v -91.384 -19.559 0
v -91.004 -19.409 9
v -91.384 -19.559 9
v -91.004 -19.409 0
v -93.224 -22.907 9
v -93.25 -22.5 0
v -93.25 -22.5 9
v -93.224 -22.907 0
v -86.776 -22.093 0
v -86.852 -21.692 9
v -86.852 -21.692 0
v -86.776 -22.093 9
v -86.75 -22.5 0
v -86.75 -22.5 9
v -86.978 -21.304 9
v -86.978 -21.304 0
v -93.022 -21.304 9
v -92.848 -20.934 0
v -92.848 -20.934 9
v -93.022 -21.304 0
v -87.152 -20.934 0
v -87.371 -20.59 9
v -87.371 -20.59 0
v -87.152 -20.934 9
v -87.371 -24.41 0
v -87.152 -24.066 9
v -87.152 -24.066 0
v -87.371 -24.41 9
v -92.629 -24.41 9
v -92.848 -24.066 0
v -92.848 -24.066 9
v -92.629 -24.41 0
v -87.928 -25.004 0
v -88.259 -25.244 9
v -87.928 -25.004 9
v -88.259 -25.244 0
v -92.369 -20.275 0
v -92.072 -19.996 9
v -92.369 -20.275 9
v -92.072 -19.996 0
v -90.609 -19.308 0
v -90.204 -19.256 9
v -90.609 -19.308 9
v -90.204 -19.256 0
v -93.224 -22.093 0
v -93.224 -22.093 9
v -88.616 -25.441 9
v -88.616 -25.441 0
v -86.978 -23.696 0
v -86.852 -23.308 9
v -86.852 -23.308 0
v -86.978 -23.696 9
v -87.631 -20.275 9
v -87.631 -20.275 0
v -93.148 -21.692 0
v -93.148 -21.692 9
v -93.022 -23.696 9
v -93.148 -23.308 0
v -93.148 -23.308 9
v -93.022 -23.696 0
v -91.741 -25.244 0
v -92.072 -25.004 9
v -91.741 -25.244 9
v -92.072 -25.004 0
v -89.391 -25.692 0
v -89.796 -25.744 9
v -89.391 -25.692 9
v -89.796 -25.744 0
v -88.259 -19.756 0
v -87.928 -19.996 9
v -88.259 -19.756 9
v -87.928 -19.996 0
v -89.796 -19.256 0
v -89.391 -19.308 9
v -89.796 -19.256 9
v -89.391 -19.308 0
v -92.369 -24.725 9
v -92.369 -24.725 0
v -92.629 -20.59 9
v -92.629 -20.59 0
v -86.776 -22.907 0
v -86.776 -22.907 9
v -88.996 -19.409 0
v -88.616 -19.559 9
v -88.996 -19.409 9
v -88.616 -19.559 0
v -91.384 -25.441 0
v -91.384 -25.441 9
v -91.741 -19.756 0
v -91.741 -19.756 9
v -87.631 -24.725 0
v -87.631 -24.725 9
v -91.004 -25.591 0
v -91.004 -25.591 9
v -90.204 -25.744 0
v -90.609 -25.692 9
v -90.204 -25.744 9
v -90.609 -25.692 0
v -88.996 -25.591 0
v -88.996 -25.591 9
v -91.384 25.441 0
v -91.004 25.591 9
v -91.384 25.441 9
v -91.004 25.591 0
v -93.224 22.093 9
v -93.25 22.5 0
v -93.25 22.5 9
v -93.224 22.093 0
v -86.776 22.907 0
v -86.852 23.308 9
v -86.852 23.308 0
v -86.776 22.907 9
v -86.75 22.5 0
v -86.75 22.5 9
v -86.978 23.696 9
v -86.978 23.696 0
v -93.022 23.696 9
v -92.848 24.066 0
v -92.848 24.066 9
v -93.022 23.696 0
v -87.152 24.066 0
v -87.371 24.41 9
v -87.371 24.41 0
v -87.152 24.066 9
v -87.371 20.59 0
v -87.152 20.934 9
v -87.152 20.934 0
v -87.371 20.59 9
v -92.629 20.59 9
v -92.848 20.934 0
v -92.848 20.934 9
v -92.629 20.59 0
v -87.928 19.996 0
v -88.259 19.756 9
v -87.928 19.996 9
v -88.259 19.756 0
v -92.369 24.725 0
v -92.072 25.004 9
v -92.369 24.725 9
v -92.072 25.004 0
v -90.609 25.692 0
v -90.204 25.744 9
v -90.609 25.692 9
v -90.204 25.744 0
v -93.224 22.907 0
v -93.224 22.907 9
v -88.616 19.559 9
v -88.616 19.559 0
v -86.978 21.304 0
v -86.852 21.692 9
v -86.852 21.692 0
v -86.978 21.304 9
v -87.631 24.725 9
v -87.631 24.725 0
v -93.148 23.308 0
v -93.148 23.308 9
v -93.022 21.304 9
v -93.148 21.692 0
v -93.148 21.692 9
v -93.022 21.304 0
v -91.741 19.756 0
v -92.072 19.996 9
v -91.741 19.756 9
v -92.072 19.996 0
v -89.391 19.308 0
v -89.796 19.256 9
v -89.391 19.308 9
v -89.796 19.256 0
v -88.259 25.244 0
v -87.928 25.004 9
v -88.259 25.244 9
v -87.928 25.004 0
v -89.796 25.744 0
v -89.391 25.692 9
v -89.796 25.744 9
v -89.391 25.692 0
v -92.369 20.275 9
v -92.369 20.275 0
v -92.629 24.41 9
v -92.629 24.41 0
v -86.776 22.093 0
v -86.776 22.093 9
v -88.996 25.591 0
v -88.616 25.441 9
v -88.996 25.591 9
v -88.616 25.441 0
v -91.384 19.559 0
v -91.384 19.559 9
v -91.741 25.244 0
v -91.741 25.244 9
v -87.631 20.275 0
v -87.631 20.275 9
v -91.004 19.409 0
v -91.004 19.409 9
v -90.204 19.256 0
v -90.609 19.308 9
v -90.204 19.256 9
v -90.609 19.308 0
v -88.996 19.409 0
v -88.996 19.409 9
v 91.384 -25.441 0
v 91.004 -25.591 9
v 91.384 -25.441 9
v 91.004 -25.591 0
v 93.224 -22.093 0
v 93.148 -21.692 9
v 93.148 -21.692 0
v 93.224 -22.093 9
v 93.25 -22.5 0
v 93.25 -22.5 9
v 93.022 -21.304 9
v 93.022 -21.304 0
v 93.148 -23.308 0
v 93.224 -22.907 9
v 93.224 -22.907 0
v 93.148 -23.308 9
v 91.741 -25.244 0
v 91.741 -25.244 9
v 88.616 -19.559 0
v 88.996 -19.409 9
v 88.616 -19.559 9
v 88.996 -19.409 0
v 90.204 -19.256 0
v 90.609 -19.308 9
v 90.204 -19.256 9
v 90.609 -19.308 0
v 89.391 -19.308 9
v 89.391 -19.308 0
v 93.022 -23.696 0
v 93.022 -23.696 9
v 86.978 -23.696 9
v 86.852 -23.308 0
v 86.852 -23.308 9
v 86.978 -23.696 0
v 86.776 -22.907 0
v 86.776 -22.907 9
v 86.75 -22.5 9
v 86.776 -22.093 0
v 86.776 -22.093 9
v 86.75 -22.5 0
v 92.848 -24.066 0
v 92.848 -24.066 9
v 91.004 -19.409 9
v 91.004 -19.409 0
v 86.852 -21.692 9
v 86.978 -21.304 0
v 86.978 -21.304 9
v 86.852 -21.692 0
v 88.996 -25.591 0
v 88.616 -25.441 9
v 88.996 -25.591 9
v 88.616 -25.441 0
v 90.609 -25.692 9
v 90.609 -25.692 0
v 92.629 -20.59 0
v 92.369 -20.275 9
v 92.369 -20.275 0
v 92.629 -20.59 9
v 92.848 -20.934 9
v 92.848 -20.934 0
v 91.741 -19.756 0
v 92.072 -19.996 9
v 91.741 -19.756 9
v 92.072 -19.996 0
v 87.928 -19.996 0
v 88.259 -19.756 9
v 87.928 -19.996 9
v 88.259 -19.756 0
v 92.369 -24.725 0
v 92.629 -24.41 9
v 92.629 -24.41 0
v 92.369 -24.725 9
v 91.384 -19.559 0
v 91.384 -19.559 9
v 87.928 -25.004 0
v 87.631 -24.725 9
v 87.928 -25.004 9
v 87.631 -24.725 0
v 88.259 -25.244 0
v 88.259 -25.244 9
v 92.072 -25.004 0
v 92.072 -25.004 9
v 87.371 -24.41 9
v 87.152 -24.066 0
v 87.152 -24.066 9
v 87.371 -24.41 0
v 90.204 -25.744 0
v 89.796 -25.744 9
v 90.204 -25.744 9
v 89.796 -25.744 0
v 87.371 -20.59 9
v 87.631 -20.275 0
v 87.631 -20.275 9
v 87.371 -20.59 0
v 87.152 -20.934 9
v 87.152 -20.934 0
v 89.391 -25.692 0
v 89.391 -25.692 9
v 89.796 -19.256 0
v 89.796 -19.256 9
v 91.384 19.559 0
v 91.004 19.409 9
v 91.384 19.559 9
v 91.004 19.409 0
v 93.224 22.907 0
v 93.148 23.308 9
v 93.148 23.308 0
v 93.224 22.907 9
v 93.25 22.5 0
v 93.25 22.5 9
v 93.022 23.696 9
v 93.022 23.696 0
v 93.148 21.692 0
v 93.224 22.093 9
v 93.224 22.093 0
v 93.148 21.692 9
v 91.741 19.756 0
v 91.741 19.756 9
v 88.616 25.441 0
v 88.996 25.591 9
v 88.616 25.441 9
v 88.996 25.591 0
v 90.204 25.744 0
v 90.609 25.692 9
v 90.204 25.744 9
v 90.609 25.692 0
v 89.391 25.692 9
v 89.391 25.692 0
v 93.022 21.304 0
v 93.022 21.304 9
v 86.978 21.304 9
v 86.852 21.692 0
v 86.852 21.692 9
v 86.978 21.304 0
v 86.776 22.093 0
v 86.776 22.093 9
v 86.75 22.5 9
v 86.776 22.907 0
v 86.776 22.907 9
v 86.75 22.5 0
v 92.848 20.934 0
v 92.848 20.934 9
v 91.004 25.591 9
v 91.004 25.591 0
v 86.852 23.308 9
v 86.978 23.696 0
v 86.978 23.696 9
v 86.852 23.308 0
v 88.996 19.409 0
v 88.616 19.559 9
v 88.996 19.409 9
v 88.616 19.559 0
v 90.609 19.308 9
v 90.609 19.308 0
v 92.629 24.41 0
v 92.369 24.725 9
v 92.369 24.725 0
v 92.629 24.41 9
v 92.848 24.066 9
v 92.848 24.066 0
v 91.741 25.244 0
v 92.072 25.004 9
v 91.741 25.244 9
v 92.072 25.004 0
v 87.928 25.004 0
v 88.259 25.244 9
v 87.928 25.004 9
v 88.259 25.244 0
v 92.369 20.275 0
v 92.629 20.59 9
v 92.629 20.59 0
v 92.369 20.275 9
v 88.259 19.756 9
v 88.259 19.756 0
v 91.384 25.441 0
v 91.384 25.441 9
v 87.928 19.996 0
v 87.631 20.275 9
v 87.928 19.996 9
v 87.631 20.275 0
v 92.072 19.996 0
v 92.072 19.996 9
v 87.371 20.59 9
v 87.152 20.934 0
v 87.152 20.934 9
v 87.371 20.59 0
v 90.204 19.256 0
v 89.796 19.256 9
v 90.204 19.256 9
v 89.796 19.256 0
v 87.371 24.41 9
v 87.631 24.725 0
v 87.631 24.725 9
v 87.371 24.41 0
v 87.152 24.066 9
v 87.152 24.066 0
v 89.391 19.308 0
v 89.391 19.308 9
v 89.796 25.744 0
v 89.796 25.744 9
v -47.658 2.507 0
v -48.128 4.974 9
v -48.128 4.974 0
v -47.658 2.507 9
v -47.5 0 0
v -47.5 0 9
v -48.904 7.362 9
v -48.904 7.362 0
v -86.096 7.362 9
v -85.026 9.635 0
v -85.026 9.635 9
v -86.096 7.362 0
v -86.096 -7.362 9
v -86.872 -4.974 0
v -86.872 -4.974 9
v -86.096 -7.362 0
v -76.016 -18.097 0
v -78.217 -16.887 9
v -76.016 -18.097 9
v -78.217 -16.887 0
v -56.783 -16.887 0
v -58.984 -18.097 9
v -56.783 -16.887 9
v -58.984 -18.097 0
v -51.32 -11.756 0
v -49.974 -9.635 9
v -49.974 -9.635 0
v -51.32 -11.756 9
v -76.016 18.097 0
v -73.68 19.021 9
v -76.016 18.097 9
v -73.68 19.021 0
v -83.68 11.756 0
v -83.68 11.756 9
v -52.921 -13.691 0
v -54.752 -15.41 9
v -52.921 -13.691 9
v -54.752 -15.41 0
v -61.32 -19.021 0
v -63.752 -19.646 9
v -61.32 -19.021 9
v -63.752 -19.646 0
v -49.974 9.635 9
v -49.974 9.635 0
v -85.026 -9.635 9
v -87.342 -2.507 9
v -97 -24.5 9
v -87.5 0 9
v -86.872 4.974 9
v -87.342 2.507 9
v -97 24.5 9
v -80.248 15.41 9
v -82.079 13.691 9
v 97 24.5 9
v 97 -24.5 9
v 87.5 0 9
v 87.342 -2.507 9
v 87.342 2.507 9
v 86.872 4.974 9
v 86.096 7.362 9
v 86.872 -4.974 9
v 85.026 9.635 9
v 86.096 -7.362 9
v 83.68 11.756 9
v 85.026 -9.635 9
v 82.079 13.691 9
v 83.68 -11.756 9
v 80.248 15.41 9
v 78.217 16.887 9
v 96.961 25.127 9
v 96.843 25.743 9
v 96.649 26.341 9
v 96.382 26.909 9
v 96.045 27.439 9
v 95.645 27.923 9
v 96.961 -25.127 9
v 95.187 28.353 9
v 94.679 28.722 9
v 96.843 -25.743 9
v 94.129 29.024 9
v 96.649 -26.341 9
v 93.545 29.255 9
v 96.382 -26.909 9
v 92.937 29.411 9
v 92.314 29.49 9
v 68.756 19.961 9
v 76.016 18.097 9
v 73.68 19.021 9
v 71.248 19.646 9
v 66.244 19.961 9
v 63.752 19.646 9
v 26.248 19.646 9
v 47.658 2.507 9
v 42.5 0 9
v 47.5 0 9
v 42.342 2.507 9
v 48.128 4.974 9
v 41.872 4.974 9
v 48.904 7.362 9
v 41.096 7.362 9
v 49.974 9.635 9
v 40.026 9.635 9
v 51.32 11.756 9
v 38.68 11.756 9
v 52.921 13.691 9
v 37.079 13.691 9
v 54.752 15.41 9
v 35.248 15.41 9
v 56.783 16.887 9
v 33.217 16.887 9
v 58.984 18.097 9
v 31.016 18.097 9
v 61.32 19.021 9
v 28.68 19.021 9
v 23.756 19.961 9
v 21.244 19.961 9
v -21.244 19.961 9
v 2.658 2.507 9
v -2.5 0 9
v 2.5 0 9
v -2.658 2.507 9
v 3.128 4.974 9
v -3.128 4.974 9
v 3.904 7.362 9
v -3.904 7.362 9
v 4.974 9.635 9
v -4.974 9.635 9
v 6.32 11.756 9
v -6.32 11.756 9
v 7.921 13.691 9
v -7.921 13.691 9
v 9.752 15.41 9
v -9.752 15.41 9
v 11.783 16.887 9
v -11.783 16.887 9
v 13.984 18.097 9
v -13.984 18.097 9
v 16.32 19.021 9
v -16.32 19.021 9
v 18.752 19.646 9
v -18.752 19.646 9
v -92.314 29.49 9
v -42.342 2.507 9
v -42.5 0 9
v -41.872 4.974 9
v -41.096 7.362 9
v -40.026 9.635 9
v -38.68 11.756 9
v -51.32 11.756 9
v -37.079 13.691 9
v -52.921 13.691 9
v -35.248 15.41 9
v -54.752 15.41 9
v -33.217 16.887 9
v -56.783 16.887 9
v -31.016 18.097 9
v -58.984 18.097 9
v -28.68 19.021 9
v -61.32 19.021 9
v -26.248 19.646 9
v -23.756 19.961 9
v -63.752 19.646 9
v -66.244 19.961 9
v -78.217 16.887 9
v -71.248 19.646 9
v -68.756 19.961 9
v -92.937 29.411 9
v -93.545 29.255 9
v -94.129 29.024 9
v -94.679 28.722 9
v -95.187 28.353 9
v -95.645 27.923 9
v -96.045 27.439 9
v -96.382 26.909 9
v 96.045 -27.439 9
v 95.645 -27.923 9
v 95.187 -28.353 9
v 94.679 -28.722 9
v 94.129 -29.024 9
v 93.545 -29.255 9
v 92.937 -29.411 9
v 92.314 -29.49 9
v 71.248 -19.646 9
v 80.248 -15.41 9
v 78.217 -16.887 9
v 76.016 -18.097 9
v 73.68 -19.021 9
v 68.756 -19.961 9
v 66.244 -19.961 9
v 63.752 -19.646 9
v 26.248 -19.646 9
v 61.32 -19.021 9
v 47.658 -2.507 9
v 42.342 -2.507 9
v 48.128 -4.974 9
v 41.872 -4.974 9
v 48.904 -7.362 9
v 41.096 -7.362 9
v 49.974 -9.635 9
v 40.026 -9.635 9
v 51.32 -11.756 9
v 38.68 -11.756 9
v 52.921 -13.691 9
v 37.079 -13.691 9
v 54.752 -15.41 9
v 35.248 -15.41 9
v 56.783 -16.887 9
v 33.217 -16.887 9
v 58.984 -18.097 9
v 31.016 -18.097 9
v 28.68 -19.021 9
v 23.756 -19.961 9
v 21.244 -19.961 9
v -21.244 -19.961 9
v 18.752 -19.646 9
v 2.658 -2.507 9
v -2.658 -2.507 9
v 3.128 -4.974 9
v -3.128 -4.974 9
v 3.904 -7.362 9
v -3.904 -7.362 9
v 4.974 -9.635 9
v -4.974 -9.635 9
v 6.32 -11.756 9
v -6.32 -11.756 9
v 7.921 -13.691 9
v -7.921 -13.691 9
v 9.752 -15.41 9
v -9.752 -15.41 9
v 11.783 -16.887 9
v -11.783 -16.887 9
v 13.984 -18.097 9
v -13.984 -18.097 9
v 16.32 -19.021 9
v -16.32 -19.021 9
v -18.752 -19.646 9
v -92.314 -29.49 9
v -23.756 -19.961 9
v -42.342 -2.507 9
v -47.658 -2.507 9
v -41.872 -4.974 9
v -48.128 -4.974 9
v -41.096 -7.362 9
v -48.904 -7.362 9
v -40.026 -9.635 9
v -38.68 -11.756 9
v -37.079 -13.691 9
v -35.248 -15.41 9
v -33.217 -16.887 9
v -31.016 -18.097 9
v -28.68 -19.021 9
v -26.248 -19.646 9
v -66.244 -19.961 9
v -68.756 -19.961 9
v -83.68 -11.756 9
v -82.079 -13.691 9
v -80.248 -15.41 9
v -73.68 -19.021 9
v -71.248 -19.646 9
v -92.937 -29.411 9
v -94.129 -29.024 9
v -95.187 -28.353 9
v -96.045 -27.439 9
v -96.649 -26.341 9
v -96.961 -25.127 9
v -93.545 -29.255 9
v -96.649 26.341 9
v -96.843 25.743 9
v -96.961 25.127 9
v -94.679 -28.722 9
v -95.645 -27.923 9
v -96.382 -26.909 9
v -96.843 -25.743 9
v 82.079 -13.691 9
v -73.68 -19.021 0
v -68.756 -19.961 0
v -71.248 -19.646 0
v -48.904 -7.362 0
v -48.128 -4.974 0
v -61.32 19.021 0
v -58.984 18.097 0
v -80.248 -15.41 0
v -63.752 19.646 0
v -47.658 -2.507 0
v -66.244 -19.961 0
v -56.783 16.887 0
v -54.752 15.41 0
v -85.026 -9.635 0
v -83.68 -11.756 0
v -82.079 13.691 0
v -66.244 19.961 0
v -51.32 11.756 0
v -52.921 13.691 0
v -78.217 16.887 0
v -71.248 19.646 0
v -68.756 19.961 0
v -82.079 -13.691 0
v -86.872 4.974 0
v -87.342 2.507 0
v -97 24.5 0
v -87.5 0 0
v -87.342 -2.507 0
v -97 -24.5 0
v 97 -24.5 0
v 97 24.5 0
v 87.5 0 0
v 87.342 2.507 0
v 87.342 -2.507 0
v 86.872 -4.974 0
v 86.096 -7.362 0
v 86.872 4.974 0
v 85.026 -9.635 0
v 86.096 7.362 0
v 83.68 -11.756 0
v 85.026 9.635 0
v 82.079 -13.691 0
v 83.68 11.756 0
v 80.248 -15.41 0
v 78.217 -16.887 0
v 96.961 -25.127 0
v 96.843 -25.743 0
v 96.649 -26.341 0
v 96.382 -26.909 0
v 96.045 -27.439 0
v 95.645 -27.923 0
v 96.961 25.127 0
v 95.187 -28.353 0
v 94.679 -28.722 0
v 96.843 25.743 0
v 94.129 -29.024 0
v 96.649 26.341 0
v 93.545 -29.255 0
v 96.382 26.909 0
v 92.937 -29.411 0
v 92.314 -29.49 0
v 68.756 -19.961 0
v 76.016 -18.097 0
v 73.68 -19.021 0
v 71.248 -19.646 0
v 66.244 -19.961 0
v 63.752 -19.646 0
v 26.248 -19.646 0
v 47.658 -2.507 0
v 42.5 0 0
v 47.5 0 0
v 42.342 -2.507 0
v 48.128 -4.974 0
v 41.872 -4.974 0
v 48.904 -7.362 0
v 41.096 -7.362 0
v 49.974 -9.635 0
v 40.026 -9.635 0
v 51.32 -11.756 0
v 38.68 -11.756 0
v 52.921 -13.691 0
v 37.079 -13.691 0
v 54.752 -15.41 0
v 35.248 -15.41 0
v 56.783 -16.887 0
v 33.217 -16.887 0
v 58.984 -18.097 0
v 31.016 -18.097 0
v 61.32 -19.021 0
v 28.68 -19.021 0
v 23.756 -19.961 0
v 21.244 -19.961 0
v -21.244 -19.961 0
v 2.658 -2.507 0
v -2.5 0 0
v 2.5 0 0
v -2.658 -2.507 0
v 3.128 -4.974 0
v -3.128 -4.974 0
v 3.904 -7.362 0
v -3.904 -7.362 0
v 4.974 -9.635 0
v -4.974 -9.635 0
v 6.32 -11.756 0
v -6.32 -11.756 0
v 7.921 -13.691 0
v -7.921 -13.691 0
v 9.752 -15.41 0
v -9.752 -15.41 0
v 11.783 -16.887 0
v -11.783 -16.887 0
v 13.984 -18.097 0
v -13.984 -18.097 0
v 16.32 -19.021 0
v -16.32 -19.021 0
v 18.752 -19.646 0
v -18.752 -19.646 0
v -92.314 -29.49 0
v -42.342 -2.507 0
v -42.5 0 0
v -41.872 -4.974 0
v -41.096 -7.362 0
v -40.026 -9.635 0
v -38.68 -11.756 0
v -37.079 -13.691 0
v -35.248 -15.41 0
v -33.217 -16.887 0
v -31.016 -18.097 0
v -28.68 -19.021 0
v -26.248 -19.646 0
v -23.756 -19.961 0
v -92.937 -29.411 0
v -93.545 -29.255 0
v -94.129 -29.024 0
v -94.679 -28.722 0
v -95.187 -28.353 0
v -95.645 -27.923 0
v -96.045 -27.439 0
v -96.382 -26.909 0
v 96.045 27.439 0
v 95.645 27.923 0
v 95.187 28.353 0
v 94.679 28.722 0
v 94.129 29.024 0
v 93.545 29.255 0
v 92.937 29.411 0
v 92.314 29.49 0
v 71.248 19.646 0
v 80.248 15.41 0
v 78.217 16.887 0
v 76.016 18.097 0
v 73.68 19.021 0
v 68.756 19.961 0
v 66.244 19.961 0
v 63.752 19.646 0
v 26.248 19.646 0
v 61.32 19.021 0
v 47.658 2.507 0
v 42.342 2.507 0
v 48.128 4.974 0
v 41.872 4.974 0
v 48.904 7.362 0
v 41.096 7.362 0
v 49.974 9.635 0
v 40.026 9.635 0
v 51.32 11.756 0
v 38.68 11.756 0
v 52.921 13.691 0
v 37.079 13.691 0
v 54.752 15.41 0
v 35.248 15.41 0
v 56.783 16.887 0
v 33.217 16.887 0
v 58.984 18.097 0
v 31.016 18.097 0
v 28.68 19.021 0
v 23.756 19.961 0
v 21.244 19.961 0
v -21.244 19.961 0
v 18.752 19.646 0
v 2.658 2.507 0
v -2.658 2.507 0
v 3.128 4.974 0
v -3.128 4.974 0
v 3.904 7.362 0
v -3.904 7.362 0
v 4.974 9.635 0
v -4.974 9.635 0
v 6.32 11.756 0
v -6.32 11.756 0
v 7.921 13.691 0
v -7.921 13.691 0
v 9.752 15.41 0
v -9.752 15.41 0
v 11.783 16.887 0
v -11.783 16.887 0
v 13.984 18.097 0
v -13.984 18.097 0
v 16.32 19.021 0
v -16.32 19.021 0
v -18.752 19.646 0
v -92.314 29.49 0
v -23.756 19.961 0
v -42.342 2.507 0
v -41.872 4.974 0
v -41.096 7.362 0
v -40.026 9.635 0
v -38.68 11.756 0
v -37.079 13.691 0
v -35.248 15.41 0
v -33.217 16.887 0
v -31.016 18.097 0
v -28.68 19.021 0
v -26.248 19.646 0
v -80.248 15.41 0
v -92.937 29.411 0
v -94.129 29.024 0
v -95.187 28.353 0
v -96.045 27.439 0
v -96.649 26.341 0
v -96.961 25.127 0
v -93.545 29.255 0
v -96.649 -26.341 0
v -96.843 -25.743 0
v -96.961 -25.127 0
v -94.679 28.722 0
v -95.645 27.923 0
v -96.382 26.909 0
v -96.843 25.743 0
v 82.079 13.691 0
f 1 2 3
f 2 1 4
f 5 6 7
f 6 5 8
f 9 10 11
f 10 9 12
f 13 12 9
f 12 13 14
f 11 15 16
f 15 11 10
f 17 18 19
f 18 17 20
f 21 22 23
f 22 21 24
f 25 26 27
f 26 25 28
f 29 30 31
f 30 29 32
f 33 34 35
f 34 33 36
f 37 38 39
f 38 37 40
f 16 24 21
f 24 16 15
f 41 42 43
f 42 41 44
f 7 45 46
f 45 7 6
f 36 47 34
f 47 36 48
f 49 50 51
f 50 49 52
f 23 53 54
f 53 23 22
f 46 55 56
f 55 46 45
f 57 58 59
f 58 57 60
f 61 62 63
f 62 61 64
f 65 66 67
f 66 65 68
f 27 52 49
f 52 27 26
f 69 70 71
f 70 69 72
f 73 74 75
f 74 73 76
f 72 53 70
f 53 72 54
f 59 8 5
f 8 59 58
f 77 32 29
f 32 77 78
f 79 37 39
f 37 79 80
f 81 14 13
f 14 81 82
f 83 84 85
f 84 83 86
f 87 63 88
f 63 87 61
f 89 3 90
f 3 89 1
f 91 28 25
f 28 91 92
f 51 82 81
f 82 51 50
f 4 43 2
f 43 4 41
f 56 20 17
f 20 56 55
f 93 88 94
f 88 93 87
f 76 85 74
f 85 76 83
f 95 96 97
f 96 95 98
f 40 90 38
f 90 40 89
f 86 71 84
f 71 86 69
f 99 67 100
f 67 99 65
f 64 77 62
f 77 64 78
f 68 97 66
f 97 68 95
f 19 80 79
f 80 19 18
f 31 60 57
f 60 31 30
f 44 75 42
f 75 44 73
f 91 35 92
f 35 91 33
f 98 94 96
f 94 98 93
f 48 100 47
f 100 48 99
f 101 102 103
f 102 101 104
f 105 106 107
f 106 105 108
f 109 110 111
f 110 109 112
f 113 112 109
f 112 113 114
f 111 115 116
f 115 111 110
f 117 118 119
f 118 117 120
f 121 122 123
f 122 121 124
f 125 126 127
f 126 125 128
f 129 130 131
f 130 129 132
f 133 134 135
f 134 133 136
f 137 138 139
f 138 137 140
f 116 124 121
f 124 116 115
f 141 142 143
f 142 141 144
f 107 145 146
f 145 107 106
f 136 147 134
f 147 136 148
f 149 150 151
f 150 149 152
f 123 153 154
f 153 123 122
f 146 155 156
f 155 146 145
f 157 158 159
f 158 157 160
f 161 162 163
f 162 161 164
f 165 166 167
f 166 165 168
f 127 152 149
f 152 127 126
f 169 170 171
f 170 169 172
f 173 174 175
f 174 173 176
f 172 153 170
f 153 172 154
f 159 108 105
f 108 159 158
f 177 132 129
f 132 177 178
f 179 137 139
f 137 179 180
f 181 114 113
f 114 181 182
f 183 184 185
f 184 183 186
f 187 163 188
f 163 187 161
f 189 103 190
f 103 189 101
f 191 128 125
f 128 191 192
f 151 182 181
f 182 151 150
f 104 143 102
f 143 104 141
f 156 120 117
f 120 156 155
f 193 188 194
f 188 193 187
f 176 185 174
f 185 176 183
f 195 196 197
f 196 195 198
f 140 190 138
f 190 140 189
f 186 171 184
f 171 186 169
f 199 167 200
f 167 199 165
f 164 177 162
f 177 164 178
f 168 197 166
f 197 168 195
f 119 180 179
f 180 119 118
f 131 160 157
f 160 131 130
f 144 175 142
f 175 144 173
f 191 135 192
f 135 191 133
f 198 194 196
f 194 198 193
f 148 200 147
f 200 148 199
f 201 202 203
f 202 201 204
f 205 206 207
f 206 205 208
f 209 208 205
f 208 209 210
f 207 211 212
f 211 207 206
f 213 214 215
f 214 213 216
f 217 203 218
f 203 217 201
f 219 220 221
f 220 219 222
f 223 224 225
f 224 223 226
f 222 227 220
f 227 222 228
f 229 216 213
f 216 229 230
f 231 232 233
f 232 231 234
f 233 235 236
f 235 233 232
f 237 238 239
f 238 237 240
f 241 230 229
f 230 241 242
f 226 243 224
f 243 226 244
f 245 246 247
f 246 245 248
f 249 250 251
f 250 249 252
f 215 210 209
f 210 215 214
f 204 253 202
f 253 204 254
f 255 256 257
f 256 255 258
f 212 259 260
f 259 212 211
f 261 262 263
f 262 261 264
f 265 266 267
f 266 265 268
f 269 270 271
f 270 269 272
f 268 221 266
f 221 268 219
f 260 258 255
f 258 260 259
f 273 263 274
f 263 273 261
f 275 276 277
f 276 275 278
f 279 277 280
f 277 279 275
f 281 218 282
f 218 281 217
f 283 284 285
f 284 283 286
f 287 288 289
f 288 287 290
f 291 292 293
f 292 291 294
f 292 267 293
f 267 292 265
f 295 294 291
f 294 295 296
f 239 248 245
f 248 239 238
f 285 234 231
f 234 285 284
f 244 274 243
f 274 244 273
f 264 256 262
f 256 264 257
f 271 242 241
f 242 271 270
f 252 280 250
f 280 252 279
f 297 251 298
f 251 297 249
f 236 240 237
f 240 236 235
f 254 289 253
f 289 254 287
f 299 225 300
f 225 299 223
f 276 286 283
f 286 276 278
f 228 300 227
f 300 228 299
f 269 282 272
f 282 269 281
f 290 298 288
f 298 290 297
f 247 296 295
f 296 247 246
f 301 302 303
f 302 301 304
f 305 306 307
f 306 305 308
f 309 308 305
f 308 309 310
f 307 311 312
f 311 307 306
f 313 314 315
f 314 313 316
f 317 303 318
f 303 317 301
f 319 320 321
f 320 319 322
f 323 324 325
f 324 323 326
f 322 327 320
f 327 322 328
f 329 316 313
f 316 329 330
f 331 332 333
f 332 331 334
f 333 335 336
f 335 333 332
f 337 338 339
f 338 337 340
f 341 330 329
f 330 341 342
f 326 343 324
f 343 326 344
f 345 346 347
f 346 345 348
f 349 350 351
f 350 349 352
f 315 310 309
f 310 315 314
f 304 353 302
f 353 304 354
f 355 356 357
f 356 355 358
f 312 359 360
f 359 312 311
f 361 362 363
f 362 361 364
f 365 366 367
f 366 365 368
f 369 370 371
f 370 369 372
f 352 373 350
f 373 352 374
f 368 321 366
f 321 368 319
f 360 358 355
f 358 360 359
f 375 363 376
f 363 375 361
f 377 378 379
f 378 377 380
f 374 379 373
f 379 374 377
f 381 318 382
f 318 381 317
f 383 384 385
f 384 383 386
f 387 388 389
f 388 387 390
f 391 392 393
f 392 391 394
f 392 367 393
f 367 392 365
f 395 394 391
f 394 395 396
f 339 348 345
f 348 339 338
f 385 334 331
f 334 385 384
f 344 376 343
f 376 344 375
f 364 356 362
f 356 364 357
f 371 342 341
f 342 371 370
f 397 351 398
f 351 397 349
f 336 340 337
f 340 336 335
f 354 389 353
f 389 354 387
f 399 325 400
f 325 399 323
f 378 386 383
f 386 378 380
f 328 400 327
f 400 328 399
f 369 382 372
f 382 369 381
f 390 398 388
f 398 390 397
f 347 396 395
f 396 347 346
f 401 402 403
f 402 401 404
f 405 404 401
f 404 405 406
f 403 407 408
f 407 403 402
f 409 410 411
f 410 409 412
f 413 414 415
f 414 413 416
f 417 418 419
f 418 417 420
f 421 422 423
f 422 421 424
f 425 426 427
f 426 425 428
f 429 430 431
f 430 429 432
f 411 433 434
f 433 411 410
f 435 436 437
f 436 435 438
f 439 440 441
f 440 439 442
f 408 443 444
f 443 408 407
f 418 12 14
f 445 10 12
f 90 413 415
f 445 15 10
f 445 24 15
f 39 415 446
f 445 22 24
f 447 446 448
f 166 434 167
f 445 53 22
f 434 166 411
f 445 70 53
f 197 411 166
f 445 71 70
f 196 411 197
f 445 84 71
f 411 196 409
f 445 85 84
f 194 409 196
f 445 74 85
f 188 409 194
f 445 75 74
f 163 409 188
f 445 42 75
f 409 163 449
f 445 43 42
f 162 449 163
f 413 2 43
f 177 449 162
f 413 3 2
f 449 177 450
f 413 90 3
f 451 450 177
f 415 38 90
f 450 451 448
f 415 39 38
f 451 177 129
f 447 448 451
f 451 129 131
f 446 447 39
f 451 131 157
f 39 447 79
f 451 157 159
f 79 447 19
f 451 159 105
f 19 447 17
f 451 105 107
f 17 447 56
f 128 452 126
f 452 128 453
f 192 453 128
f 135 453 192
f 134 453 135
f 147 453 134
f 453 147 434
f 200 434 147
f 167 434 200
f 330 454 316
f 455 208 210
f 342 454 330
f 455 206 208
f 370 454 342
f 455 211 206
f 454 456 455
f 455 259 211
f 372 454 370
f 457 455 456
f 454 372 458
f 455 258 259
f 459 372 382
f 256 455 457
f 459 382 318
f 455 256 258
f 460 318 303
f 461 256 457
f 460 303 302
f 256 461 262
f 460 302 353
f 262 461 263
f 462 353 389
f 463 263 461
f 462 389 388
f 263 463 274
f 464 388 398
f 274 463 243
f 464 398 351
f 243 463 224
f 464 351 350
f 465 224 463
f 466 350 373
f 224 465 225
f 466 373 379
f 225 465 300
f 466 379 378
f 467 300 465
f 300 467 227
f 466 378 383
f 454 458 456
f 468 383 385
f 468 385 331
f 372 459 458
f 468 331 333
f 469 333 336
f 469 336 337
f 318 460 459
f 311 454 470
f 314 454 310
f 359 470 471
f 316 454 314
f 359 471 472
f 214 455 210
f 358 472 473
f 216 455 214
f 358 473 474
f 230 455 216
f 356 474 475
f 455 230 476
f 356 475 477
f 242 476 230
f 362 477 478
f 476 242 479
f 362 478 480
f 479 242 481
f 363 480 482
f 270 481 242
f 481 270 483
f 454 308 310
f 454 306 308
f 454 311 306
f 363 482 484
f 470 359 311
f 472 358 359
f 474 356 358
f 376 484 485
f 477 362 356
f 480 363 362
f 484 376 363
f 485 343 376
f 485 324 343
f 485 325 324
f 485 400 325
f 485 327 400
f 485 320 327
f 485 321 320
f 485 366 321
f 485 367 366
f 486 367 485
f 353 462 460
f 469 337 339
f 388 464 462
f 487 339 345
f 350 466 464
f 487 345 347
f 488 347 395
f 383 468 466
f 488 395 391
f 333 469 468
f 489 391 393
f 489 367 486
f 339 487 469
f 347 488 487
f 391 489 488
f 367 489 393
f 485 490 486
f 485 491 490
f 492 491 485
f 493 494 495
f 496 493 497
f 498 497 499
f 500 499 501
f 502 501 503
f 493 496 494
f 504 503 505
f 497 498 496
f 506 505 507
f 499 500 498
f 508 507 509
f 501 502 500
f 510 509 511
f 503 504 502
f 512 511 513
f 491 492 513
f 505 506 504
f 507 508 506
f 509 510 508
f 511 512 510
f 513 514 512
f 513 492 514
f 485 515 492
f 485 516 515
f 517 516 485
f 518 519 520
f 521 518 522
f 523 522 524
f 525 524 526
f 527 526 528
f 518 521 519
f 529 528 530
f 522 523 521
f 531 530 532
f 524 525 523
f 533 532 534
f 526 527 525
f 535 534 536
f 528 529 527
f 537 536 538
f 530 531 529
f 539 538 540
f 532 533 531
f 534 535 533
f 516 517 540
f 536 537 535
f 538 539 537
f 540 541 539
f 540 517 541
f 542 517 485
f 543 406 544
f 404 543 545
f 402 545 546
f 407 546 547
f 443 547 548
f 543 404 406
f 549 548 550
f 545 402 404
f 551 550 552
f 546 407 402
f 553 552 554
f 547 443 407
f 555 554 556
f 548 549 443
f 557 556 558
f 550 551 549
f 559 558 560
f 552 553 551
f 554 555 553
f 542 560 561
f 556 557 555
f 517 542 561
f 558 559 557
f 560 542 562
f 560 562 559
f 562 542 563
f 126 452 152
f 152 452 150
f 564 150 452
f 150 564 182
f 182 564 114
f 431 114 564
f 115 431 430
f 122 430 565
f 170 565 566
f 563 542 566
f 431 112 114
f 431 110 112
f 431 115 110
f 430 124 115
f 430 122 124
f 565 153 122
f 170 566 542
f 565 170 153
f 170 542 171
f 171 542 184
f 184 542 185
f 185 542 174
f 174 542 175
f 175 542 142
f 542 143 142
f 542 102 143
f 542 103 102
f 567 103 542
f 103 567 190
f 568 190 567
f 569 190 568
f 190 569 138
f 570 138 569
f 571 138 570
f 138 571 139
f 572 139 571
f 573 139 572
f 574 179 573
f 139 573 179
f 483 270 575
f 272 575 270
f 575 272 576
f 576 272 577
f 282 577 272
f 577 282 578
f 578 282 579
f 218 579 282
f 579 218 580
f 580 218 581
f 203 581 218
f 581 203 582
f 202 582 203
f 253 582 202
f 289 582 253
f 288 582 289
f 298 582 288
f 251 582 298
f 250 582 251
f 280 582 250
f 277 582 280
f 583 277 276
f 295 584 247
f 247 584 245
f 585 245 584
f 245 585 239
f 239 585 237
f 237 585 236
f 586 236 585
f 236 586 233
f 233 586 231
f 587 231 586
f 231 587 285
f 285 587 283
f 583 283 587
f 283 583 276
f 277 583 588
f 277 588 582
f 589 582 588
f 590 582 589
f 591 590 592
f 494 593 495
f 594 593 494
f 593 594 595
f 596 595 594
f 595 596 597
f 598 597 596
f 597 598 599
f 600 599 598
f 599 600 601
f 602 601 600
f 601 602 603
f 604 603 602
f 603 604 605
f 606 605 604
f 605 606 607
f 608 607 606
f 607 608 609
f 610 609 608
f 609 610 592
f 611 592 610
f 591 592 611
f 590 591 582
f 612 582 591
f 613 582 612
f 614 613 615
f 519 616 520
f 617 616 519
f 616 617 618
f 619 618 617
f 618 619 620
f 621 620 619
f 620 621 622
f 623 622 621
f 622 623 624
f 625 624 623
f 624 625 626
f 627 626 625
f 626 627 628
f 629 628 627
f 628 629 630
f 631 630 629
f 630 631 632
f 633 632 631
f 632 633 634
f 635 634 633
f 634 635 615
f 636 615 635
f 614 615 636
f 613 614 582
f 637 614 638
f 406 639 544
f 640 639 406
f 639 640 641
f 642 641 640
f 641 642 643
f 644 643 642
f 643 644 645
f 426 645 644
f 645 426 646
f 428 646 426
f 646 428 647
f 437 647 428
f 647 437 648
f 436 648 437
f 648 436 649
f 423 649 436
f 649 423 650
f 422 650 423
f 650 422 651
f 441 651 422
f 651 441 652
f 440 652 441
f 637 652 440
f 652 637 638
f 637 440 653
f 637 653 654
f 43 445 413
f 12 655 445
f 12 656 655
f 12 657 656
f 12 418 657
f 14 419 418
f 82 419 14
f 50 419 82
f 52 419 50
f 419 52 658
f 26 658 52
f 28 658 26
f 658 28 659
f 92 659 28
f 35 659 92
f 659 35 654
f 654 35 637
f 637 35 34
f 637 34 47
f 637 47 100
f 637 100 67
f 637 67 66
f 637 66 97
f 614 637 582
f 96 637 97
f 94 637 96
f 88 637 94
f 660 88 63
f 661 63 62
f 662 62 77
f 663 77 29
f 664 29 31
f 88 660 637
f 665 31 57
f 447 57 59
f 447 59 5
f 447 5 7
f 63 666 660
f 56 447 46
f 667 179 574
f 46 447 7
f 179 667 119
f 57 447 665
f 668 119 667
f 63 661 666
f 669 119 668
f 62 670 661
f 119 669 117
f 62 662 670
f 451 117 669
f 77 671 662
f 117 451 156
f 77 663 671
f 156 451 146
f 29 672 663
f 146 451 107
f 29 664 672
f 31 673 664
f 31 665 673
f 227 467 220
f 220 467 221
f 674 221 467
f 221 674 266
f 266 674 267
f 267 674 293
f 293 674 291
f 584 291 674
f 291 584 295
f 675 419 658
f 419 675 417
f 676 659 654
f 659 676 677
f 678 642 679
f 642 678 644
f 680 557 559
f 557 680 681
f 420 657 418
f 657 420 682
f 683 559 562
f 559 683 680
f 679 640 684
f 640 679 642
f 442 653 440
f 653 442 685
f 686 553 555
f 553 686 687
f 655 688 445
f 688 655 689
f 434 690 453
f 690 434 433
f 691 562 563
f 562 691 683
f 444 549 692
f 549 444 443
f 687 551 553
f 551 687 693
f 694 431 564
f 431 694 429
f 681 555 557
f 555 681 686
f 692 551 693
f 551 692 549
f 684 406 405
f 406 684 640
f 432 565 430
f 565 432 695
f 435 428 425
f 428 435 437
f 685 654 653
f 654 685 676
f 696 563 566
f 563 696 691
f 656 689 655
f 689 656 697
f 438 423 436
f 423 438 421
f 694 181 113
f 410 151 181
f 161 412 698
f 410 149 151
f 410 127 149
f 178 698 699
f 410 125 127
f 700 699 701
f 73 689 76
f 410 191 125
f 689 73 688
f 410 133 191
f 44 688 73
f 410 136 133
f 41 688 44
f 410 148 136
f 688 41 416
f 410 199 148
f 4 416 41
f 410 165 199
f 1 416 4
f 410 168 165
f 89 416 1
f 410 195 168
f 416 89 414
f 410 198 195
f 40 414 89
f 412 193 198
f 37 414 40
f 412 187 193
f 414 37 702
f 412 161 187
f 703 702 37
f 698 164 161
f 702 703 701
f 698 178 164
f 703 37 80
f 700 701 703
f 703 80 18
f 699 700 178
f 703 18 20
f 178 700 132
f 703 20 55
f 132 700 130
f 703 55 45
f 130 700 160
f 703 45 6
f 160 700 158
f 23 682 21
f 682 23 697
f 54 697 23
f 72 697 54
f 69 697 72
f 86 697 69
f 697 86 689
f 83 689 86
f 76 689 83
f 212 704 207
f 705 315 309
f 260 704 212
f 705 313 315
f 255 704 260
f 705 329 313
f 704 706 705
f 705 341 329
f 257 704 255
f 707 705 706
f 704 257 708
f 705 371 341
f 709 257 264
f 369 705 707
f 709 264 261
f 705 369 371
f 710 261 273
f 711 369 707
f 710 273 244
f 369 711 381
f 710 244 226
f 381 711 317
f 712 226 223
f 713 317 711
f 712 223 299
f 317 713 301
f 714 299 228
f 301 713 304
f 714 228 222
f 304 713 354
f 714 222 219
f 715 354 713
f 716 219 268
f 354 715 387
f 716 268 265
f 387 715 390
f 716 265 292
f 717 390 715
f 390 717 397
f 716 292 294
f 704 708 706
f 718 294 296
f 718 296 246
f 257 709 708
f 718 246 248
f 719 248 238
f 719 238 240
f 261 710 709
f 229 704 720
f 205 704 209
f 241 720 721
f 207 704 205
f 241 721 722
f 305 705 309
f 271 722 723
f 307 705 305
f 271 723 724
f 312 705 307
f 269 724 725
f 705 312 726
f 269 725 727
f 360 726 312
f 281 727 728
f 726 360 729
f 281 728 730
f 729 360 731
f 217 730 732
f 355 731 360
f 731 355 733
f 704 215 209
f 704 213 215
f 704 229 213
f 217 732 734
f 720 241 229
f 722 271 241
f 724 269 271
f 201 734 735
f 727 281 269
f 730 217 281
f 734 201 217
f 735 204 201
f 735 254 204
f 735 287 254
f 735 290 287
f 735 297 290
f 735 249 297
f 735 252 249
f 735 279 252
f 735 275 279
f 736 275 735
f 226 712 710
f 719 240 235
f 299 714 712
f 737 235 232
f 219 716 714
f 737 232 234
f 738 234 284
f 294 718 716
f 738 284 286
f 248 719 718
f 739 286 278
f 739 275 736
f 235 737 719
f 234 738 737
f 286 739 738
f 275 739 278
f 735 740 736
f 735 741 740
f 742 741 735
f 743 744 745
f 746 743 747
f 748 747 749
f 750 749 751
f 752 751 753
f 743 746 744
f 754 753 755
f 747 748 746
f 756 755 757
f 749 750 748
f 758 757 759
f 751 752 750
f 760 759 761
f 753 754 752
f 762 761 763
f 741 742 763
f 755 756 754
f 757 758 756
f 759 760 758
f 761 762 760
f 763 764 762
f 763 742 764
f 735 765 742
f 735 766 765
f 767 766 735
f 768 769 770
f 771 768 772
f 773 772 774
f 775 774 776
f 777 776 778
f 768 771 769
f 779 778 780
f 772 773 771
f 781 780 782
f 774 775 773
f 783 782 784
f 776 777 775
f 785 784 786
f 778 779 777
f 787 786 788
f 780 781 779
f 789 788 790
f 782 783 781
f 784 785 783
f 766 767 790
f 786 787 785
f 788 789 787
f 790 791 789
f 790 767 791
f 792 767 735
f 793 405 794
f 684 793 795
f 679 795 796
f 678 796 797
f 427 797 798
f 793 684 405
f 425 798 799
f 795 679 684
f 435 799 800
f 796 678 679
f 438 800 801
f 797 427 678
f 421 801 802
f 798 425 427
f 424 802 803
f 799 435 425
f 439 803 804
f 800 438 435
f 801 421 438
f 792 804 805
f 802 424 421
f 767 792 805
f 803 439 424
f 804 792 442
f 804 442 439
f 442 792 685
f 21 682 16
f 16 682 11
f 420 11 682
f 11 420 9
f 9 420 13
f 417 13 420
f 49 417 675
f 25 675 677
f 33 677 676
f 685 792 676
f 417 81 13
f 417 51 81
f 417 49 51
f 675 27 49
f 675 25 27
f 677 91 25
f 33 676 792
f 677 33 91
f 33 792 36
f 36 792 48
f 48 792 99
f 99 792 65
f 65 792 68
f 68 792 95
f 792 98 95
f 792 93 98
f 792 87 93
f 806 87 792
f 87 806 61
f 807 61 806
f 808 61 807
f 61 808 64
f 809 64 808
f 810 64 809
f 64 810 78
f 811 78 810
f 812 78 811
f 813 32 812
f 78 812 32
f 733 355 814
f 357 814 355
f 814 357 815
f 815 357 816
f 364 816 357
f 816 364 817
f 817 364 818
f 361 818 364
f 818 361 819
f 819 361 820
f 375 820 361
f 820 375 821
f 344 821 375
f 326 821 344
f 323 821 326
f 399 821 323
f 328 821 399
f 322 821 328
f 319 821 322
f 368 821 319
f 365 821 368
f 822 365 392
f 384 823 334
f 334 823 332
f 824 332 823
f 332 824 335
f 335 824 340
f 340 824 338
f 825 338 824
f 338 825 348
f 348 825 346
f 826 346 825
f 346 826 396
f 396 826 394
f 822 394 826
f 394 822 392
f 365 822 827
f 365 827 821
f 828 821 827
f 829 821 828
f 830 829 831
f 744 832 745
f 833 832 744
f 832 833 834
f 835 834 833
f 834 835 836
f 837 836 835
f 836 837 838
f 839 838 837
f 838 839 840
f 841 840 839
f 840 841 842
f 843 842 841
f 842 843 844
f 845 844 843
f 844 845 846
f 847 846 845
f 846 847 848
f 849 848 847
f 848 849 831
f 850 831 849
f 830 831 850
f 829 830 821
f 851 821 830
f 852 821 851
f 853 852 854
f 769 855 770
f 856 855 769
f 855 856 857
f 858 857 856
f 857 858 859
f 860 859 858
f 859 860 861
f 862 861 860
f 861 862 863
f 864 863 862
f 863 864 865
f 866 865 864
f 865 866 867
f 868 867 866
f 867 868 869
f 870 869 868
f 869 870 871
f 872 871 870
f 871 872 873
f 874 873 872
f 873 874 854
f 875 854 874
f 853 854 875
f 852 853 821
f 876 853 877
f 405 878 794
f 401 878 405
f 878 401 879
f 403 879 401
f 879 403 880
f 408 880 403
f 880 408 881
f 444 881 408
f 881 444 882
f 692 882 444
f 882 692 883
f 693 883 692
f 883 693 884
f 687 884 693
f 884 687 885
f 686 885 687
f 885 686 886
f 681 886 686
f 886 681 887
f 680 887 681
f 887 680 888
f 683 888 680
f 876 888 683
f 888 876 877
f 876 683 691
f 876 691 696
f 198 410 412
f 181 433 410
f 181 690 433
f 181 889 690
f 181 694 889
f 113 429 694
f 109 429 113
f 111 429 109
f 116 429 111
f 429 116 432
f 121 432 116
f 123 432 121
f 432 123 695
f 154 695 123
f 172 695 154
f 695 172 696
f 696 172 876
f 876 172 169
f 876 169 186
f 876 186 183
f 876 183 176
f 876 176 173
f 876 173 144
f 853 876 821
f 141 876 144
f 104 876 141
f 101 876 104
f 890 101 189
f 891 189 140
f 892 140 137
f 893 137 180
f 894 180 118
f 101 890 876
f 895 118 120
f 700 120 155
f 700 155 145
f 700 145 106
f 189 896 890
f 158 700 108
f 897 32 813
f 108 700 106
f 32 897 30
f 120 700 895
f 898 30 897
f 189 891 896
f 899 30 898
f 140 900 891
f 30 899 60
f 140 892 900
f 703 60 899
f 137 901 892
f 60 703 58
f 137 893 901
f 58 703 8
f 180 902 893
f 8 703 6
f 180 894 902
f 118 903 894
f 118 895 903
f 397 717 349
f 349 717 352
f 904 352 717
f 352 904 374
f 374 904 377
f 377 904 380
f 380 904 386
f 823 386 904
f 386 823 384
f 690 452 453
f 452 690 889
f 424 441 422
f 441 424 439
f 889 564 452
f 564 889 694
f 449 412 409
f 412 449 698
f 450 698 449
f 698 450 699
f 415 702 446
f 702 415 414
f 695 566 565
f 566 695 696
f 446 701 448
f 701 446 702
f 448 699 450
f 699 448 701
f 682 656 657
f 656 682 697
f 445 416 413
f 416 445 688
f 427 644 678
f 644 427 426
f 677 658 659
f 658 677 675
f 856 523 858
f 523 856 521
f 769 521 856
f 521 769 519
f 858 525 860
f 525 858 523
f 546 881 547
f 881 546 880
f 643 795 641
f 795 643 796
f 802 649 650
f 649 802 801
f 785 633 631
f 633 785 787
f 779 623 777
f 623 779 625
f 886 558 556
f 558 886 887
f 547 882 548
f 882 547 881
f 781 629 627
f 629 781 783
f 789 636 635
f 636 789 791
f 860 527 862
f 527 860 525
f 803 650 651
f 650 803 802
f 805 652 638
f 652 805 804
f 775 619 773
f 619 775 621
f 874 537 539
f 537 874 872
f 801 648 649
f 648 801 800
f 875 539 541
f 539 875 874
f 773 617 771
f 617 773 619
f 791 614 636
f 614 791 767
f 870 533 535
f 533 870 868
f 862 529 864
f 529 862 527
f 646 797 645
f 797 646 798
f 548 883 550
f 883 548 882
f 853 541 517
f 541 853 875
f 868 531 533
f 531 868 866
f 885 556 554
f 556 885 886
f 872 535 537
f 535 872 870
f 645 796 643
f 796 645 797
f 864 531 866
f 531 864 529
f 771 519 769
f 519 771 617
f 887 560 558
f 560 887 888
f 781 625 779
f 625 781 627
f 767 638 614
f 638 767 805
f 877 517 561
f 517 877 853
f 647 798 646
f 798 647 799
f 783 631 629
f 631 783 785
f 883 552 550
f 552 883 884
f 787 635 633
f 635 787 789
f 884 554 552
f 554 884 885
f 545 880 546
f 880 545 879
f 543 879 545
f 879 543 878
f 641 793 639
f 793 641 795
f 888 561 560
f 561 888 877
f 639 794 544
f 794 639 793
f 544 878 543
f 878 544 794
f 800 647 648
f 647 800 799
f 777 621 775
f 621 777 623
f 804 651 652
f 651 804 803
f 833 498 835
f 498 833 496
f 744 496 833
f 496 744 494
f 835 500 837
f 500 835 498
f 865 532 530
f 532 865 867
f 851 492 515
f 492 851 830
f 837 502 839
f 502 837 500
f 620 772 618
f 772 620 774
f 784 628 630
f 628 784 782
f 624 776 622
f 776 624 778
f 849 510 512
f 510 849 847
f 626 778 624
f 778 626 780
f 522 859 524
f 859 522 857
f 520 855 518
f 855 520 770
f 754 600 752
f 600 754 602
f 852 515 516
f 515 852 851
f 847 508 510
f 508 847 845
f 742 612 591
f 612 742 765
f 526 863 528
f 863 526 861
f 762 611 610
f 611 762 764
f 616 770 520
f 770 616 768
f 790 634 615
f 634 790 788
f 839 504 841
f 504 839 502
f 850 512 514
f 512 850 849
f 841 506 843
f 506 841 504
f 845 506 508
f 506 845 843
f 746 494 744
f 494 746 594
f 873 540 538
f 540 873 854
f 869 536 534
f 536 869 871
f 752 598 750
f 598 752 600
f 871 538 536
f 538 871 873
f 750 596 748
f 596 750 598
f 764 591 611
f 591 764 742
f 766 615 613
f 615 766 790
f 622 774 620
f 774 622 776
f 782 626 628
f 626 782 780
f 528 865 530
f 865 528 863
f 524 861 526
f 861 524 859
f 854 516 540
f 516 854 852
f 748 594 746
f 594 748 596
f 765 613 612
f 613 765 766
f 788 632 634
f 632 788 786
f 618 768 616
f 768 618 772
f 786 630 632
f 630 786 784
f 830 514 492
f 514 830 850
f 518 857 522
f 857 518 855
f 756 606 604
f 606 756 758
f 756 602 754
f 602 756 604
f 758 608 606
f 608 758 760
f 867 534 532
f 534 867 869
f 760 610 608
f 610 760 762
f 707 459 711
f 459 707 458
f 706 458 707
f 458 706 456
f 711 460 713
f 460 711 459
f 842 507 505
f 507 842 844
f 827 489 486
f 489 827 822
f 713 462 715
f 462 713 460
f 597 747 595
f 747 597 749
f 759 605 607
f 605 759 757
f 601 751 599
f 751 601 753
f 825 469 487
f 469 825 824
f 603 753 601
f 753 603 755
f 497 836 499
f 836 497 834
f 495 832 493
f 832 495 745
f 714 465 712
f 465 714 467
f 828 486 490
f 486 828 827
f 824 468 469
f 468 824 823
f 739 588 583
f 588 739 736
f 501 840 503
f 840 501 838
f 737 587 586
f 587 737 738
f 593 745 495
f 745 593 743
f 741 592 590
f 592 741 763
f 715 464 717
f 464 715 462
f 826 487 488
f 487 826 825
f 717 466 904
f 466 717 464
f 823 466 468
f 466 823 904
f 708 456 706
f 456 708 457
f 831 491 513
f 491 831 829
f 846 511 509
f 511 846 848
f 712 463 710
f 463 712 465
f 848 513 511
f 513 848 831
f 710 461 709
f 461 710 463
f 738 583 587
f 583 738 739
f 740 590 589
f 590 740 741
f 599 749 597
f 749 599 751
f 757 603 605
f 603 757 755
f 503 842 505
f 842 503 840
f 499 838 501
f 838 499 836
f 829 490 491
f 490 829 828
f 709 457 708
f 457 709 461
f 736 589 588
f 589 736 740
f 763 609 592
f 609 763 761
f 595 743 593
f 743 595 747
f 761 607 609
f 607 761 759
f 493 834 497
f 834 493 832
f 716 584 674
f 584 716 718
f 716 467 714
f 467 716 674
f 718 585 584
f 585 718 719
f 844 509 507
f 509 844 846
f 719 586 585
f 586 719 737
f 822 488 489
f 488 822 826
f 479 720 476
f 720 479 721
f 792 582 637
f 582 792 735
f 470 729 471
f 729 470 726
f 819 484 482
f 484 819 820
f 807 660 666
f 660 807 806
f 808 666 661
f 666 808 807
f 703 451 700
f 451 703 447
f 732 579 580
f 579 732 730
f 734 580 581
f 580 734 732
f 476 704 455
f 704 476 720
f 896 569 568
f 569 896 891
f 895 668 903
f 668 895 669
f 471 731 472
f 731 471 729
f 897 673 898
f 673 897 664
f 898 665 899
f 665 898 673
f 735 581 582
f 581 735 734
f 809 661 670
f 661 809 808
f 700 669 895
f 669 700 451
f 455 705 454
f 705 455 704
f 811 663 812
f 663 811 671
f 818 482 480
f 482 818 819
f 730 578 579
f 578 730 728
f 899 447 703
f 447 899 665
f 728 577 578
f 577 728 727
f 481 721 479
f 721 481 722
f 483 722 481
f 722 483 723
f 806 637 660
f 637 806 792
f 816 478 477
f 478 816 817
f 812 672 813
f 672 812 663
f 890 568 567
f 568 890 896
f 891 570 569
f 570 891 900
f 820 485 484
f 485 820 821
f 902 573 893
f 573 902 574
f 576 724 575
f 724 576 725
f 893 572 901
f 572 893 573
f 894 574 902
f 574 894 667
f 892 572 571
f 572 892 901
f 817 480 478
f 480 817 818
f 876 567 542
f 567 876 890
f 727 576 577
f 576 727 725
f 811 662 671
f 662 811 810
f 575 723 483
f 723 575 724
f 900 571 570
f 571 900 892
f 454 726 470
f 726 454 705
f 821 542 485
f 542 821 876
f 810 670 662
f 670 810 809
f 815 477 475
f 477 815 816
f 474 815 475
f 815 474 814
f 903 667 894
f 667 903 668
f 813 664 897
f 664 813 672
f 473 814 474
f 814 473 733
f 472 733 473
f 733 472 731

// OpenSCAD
$fn = 50;


difference() {
	union() {
		hull() {
			translate(v = [-92.0000000000, 24.5000000000, 0]) {
				cylinder(h = 9, r = 5);
			}
			translate(v = [92.0000000000, 24.5000000000, 0]) {
				cylinder(h = 9, r = 5);
			}
			translate(v = [-92.0000000000, -24.5000000000, 0]) {
				cylinder(h = 9, r = 5);
			}
			translate(v = [92.0000000000, -24.5000000000, 0]) {
				cylinder(h = 9, r = 5);
			}
		}
	}
	union() {
		#translate(v = [-90.0000000000, -22.5000000000, -100.0000000000]) {
			cylinder(h = 200, r = 3.2500000000);
		}
		#translate(v = [-90.0000000000, 22.5000000000, -100.0000000000]) {
			cylinder(h = 200, r = 3.2500000000);
		}
		#translate(v = [90.0000000000, -22.5000000000, -100.0000000000]) {
			cylinder(h = 200, r = 3.2500000000);
		}
		#translate(v = [90.0000000000, 22.5000000000, -100.0000000000]) {
			cylinder(h = 200, r = 3.2500000000);
		}
		#translate(v = [-67.5000000000, 0, 0]) {
			cylinder(h = 9, r = 20.0000000000);
		}
		#translate(v = [-22.5000000000, 0, 0]) {
			cylinder(h = 9, r = 20.0000000000);
		}
		#translate(v = [22.5000000000, 0, 0]) {
			cylinder(h = 9, r = 20.0000000000);
		}
		#translate(v = [67.5000000000, 0, 0]) {
			cylinder(h = 9, r = 20.0000000000);
		}
	}
}
